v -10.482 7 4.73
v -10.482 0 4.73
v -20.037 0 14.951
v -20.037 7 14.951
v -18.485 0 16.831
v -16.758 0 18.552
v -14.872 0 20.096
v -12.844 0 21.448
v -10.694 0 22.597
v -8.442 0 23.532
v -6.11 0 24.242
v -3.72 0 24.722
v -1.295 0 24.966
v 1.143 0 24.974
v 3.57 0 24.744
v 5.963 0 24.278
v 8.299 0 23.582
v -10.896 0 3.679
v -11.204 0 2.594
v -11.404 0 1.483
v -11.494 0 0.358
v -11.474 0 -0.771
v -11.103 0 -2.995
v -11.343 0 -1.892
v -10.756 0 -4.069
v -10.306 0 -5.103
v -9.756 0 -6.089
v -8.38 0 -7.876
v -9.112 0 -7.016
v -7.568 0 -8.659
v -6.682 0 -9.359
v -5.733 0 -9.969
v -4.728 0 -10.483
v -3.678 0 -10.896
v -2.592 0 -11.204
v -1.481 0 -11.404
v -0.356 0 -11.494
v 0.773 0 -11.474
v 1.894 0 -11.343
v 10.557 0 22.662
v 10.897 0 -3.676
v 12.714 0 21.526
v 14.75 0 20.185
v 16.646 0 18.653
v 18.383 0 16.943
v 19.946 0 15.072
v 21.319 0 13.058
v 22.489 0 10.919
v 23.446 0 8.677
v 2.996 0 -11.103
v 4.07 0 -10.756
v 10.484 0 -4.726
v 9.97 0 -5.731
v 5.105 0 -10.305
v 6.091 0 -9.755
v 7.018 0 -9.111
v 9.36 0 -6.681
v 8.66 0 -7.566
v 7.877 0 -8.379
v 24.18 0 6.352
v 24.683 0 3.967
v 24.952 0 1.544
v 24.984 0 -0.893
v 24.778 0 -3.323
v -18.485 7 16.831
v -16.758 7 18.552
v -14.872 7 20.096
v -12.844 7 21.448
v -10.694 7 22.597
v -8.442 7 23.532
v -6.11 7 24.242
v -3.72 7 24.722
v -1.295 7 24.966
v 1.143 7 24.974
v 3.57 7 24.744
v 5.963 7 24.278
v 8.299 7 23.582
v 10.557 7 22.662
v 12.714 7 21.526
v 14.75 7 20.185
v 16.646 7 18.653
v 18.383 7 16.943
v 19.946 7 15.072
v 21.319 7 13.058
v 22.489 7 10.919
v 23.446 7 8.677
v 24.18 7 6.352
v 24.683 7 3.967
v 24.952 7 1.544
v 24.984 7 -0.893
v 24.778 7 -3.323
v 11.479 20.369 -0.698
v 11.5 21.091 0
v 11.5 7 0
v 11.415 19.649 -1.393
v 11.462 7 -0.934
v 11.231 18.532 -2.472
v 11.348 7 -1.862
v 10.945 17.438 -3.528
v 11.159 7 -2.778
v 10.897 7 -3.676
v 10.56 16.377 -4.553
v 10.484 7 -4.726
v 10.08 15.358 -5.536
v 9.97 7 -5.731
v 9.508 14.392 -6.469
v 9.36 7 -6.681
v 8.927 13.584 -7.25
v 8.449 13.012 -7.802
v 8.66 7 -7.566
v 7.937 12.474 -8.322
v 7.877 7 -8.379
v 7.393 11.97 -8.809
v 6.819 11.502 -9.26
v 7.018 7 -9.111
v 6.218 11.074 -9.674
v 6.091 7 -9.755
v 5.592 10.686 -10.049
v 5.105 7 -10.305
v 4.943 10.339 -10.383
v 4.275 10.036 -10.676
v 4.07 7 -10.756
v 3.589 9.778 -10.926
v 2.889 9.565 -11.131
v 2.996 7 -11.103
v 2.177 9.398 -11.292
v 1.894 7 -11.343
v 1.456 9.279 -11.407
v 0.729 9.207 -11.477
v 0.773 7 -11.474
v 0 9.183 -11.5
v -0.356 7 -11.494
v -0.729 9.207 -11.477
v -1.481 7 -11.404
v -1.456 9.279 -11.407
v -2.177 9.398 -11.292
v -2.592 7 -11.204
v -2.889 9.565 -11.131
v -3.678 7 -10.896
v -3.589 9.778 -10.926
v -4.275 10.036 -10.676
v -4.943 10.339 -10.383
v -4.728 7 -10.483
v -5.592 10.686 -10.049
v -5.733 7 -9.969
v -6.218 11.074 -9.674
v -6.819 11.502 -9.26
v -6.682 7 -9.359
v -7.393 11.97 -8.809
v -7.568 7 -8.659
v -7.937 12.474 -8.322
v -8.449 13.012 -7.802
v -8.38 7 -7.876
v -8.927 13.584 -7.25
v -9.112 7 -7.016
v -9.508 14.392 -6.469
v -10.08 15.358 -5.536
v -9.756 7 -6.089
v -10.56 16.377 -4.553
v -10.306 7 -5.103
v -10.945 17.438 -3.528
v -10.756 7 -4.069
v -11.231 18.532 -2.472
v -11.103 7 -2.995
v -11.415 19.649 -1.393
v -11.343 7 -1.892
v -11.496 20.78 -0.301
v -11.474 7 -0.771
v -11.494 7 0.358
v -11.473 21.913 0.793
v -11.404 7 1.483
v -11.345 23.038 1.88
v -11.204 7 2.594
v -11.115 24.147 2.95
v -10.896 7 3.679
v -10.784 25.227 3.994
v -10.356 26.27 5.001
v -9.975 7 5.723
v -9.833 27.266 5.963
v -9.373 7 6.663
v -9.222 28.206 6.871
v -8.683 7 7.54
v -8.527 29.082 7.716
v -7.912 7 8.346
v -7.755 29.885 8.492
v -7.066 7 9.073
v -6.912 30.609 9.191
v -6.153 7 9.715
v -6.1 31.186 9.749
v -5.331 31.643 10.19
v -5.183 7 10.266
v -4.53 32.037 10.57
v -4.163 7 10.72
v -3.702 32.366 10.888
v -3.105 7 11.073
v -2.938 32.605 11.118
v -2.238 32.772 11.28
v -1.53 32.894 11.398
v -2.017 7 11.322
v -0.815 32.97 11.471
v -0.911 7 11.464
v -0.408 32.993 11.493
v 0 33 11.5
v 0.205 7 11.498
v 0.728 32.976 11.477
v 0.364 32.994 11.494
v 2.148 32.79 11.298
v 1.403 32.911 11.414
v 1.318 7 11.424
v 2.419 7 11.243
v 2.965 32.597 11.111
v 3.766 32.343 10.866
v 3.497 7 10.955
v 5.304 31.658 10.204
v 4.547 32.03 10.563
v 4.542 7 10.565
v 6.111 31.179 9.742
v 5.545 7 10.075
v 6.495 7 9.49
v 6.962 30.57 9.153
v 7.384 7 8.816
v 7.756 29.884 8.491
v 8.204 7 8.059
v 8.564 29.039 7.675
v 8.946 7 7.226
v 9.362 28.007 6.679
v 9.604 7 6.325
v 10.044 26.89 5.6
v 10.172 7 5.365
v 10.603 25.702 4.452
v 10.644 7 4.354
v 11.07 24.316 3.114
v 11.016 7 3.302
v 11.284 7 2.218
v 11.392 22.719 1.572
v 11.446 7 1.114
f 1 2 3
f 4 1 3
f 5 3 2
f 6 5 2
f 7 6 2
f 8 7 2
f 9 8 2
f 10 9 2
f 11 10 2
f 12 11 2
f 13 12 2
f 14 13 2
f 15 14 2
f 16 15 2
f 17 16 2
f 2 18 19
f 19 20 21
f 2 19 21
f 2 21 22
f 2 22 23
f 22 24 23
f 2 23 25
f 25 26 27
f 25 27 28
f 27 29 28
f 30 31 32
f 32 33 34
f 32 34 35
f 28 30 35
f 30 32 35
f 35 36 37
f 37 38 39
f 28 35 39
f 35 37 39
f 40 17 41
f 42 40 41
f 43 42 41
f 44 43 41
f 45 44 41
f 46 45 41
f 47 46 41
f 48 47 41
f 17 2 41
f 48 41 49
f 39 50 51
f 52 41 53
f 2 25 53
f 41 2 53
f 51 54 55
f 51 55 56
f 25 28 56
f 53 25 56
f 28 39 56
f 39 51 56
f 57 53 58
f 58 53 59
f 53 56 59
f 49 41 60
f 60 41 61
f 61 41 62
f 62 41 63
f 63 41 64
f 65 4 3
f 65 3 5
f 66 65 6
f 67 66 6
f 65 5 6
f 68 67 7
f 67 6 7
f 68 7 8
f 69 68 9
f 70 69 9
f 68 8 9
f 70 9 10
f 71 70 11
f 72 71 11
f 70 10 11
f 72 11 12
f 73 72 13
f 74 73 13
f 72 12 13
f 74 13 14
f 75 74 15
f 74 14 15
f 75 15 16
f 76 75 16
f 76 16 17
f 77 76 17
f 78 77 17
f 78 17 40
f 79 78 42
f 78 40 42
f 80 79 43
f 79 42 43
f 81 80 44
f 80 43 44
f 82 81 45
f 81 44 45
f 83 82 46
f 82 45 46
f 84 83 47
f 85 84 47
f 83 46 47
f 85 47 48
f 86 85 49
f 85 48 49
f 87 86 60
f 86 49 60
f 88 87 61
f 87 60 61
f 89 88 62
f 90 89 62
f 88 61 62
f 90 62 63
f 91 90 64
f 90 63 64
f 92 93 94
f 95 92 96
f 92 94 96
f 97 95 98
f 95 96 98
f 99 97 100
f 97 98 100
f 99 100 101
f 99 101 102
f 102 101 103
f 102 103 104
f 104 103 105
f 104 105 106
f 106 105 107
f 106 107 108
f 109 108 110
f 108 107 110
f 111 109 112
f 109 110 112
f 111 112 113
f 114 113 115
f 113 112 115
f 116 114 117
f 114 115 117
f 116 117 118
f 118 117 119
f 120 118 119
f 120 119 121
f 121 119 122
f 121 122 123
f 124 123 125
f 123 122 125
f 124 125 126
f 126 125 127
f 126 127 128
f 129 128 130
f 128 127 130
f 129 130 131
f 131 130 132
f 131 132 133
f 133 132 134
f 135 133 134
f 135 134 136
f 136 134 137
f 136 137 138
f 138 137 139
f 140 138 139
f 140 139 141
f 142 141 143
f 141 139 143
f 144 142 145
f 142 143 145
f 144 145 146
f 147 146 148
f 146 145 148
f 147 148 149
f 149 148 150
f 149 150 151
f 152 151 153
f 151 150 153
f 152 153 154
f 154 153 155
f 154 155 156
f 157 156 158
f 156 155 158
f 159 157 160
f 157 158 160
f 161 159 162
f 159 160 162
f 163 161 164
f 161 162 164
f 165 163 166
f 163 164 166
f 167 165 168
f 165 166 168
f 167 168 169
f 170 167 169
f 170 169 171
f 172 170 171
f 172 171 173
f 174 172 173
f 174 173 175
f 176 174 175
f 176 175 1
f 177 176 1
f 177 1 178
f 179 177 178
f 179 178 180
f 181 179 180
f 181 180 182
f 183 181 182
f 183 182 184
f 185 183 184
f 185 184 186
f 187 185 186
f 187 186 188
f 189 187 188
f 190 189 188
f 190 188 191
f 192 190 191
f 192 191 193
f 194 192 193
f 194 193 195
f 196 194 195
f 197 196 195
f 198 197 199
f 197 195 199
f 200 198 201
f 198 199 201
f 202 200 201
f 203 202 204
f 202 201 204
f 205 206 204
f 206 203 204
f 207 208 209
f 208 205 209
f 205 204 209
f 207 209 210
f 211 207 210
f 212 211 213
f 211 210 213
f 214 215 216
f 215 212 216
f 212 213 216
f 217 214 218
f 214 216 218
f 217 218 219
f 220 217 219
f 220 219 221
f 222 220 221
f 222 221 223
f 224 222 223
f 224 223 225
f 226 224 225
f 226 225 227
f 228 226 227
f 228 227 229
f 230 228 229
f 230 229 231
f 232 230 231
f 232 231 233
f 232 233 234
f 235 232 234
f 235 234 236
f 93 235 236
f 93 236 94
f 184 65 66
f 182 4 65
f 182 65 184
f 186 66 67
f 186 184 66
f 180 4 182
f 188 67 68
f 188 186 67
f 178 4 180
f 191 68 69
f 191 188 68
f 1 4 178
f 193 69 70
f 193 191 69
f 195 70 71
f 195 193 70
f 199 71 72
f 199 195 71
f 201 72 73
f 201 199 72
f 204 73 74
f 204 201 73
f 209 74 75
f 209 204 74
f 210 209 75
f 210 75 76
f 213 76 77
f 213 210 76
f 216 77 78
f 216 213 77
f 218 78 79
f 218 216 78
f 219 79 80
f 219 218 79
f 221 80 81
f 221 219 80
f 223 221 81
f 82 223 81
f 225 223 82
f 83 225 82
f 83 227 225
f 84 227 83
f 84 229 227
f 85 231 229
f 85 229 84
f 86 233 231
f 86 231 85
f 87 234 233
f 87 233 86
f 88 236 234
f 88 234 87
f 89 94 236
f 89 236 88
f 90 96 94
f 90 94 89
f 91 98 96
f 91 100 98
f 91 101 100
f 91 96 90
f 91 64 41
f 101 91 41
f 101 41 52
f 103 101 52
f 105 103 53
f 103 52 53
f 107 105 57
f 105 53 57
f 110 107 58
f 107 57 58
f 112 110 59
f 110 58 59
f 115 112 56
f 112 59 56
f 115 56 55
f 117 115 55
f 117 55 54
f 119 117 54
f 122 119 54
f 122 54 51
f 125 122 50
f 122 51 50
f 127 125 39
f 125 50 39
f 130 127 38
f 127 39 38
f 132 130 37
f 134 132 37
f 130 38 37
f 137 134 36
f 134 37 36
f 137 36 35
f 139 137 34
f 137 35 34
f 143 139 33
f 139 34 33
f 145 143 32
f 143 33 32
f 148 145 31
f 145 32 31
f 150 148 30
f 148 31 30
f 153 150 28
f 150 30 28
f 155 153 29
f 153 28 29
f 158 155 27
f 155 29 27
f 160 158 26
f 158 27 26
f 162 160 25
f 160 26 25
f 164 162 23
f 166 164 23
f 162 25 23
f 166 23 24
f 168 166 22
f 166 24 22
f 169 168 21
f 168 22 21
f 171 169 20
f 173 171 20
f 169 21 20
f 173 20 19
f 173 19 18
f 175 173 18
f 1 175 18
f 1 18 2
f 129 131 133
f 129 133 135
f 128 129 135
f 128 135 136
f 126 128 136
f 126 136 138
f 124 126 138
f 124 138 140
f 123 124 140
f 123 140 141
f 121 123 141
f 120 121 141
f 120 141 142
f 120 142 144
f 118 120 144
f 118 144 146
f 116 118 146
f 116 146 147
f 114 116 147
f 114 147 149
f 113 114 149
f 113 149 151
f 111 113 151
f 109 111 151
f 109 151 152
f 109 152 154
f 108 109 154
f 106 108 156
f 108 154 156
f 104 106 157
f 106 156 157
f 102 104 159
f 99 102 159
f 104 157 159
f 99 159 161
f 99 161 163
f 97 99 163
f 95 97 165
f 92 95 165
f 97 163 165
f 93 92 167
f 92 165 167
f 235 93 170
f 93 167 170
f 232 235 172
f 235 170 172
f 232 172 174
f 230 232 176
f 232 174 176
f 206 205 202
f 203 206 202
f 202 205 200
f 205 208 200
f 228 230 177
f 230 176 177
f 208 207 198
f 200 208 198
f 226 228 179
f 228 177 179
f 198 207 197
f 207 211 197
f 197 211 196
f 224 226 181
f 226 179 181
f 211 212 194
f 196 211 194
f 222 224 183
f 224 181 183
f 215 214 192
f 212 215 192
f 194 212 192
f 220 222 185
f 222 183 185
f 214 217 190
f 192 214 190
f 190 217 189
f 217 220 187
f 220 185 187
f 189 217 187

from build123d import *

# Parameters (mm, degrees)
BOSS_EXTRUDE1_DEPTH     = 7
SKETCH2_R               = 11.5
BOSS_EXTRUDE2_DEPTH     = 26
CUT_EXTRUDE1_DEPTH      = 26
CUT_EXTRUDE1_DEPTH_BACK = 26


with BuildPart() as part:
    # Sketch1 → Boss-Extrude1 (new body)
    with BuildSketch(Plane(origin=(0, 0, 0), x_dir=(1, 0, 0), z_dir=(0, 1, 0))):
        with BuildLine():
            Line((24.778235728, 3.32250421), (10.896730509, 3.67576716))
            ThreePointArc((10.896730509, 3.67576716), (-4.207828527, 10.702531433), (-10.482370924, -4.729682845))
            Line((-10.482370924, -4.729682845), (-20.036775025, -14.950841))
            ThreePointArc((-20.036775025, -14.950841), (9.439234539, -23.149532421), (24.778235728, 3.32250421))
        make_face()
    extrude(amount=BOSS_EXTRUDE1_DEPTH)

    # Sketch2 → Boss-Extrude2 (add)
    with BuildSketch(Plane(origin=(0, 7, 0), x_dir=(1, 0, 0), z_dir=(0, 1, 0))):
        Circle(SKETCH2_R)
    extrude(amount=BOSS_EXTRUDE2_DEPTH)

    # Sketch5 → Cut-Extrude1 (cut, two sides: drawn at the far end of the back side and taken through both)
    with BuildSketch(Plane(origin=(0, 0, 0), x_dir=(0, 0, -1), z_dir=(1, 0, 0)).offset(-CUT_EXTRUDE1_DEPTH_BACK)):
        Polygon((11.5, 33), (-11.5, 33), (11.5, 9.182802783), align=None)
    extrude(amount=CUT_EXTRUDE1_DEPTH + CUT_EXTRUDE1_DEPTH_BACK, mode=Mode.SUBTRACT)


solid = part.part
